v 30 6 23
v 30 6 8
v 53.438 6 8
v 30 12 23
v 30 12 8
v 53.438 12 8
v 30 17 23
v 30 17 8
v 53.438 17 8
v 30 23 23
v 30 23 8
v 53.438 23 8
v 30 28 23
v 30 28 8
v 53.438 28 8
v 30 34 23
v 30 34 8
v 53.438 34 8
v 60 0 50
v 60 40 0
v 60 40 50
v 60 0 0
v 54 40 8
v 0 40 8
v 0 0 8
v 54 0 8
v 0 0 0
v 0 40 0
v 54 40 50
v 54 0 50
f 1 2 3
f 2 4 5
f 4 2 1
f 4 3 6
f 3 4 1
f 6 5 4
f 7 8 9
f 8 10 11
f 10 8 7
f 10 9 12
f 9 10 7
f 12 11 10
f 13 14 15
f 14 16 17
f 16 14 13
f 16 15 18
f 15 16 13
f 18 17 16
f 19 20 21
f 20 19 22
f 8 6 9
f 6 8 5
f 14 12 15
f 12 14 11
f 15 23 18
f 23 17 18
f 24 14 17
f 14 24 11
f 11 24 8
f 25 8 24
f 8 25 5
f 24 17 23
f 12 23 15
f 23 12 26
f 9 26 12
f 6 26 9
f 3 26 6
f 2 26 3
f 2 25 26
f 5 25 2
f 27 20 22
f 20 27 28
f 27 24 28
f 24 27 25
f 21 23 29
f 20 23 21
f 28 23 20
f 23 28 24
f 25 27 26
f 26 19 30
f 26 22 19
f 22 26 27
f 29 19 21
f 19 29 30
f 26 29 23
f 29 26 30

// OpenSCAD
$fn = 32;

// ----------------------------------------------------------------------
// Rib bracket: 3-gusset L bracket
// ----------------------------------------------------------------------

// --- parameters (mm) ---
base_l = 60;              // foot length, X
base_w = 40;              // foot width, Y
base_t = 8;               // foot thickness
plate_t = 6;              // upright plate thickness
plate_h = 50;             // overall height
gus_l = 24;               // gusset leg along the foot
gus_h = 16;               // gusset height
gus_t = 6;                // gusset thickness
gus_edge = 6;             // gusset margin from the foot edge
n_gus = 3;                // gusset count

gus_pitch = (base_w - 2 * gus_edge - gus_t) / (n_gus - 1);  // gusset pitch

union() {
  cube([base_l, base_w, base_t]);
  translate([base_l - plate_t, 0, base_t - 1])
    cube([plate_t, base_w, plate_h - base_t + 1]);
  for (i = [0 : n_gus - 1])
    translate([base_l - plate_t - gus_l, gus_edge + i * gus_pitch, base_t - 1])
      rotate([-90, 0, 0])
        linear_extrude(height = gus_t)
          polygon(points = [[0, 0], [gus_l + 1, 0], [0, -gus_h]]);
}
